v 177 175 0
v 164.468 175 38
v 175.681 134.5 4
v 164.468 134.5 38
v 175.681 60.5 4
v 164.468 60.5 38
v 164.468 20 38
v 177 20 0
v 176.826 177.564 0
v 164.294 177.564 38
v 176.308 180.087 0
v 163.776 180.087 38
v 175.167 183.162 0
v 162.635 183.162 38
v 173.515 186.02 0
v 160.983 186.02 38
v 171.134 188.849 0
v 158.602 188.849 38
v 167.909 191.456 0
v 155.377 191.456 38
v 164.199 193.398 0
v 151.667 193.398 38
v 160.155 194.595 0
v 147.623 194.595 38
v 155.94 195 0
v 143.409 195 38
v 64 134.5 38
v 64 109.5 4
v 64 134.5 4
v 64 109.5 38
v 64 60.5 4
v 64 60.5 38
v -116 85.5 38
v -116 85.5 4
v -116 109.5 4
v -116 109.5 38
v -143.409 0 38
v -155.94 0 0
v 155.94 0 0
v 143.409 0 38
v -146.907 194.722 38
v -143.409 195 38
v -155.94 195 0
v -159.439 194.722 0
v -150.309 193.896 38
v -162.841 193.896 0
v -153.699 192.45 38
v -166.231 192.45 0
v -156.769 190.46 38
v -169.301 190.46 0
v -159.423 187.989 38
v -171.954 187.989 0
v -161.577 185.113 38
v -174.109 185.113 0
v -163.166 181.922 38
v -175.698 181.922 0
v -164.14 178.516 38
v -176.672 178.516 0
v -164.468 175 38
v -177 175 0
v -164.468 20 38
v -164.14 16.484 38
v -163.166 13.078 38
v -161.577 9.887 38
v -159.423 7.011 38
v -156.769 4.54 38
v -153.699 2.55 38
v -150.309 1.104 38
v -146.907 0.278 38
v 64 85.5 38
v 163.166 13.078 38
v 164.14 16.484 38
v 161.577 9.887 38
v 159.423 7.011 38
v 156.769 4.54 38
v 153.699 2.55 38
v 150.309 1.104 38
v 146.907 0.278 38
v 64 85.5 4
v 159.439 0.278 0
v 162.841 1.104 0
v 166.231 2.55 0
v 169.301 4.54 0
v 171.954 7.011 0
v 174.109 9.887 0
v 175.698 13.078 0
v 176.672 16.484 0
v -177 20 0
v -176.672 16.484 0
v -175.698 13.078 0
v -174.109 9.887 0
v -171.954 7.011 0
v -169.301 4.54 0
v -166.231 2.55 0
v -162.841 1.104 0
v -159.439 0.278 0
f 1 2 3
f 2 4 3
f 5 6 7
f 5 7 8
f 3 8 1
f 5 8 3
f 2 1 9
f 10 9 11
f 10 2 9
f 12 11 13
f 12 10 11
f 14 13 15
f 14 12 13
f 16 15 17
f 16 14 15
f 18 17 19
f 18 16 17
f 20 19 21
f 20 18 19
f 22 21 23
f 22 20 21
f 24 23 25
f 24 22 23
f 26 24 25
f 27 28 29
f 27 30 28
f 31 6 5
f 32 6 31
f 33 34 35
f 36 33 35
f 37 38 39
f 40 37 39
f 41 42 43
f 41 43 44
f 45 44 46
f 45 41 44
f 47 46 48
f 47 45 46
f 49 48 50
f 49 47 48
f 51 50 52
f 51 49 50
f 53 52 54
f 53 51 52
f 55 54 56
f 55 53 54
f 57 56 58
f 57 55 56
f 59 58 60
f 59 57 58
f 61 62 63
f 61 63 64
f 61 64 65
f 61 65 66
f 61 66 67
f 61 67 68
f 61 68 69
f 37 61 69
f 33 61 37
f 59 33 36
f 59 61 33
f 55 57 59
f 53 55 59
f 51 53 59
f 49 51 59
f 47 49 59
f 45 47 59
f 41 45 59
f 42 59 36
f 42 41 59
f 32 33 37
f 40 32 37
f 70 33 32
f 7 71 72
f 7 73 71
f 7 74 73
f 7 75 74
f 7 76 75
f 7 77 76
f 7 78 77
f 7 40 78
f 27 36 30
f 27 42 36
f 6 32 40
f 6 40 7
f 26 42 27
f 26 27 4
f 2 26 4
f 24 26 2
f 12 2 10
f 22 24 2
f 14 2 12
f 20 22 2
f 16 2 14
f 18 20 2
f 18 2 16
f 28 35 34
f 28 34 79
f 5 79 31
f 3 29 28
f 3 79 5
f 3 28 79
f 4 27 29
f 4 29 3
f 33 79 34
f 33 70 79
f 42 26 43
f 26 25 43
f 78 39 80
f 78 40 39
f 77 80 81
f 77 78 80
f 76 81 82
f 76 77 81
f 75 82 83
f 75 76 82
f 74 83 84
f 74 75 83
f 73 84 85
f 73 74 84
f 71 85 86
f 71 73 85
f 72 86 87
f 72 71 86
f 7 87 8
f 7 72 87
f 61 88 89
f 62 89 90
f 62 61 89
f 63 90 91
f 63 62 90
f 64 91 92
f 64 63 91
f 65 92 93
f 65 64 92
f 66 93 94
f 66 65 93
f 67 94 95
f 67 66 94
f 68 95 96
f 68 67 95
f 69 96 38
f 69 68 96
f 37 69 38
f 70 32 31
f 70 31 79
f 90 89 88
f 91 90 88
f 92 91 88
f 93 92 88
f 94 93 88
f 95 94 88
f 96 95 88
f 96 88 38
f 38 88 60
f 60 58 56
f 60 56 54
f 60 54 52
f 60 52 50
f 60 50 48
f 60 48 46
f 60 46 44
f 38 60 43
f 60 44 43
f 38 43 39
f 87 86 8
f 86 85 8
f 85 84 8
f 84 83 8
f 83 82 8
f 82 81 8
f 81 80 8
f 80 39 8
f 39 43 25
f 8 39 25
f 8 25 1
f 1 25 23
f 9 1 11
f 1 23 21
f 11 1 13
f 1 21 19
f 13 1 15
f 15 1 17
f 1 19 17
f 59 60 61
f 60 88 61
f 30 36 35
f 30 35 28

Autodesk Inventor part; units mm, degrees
ref_plane "YZ Plane" through (0, 0, 0) normal (1, 0, 0) x (0, 1, 0)
ref_plane "XZ Plane" through (0, 0, 0) normal (0, 1, 0) x (-1, 0, 0)
ref_plane "XY Plane" through (0, 0, 0) normal (0, 0, 1) x (1, 0, 0)
sketch "Skizze2" plane through (0, 0, 0) normal (0, 0, 1) x (1, 0, 0)
  line L0 (-177, 0) -> (177, 0)
  line L1 (177, 0) -> (177, 195)
  line L2 (177, 195) -> (-177, 195)
  line L3 (-177, 195) -> (-177, 0)
  point P0 (0, 0)
  point P1 (0, 0)
  dimension "d0" = 195
  dimension "d1" = 354
extrude "Extrusion1" add sketch "Skizze2" along normal blind 38
sketch "Skizze3" plane through (-177, 0, 0) normal (0, -1, 0) x (1, 0, 0)
  line L0 (354, 0) -> (0, 0) projected
  line L1 (0, 0) -> (15.5, 47)
  line L2 (15.5, 47) -> (0, 47)
  line L3 (0, 47) -> (0, 0)
  dimension "d7" = 15.5
extrude "Extrusion2" cut sketch "Skizze3" against normal up to surface (195 mm away)
mirror "Spiegeln1" about plane through (0, 0, 0) normal (1, 0, 0) of "Extrusion2"
fillet "Rundung1" radius 20 4 edges at (170.734, 0, 19) (170.734, 195, 19) (-170.734, 195, 19) (-170.734, 0, 19)
sketch "Skizze4" plane through (0, 0, 38) normal (0, 0, 1) x (1, 0, 0)
  ellipse E0 centre (-143.4086, 20) end of major axis (-164.4681, 20) minor radius 20 (-164.4681, 20) -> (-143.4086, 0) ccw projected
  line L0 (-143.4086, 0) -> (143.4086, 0) projected
  ellipse E1 centre (143.4086, 20) end of major axis (164.4681, 20) minor radius 20 (143.4086, 0) -> (164.4681, 20) ccw projected
  line L1 (164.4681, 20) -> (164.4681, 175) projected
  ellipse E2 centre (143.4086, 175) end of major axis (164.4681, 175) minor radius 20 (164.4681, 175) -> (143.4086, 195) ccw projected
  line L2 (143.4086, 195) -> (-143.4086, 195) projected
  ellipse E3 centre (-143.4086, 175) end of major axis (-164.4681, 175) minor radius 20 (-143.4086, 195) -> (-164.4681, 175) ccw projected
  line L3 (-164.4681, 175) -> (-164.4681, 20) projected
  line L4 (177, 60.5) -> (64, 60.5)
  line L5 (64, 60.5) -> (64, 85.5)
  line L6 (64, 85.5) -> (-116, 85.5)
  line L7 (-116, 85.5) -> (-116, 109.5)
  line L8 (-116, 109.5) -> (64, 109.5)
  line L9 (64, 109.5) -> (64, 134.5)
  line L10 (64, 134.5) -> (177, 134.5)
  line L11 (177, 20) -> (177, 175) projected
  line L12 (-177, 175) -> (-177, 20) projected
  line L13 (164.4681, 20) -> (164.4681, 175) projected
  point P0 (0, 0)
  point P1 (-116, 97.5)
  point P2 (164.4681, 97.5)
  point P3 (164.4681, 97.5)
  dimension "d12" = 113
  dimension "d14" = 24
  dimension "d15" = 74
  dimension "d16" = 37
  dimension "d17" = 180
extrude "Extrusion3" cut sketch "Skizze4" against normal blind 34 contours L4 L5 L6 L7 L8 L9 L10 L1 | L1 L10 L11 L4
sketch "Sketch7" plane through (64, 60.5, 38) normal (1, 0, 0) x (0, 0, -1)
  line L0 (0, 25) -> (34, 25) projected
  line L1 (34, 25) -> (34, 49) projected
  line L2 (0, 49) -> (34, 49) projected
  circle A0 centre (13, 37) radius 11
  line L3 (0, 25) -> (0, 49) projected
  point P0 (38, -60.5)
  point P1 (17, 49)
  point P2 (0, 37)
  dimension "d35" = 22
  dimension "d36" = 21
properties part number "1 part 1" material "Holz (Birke)"
